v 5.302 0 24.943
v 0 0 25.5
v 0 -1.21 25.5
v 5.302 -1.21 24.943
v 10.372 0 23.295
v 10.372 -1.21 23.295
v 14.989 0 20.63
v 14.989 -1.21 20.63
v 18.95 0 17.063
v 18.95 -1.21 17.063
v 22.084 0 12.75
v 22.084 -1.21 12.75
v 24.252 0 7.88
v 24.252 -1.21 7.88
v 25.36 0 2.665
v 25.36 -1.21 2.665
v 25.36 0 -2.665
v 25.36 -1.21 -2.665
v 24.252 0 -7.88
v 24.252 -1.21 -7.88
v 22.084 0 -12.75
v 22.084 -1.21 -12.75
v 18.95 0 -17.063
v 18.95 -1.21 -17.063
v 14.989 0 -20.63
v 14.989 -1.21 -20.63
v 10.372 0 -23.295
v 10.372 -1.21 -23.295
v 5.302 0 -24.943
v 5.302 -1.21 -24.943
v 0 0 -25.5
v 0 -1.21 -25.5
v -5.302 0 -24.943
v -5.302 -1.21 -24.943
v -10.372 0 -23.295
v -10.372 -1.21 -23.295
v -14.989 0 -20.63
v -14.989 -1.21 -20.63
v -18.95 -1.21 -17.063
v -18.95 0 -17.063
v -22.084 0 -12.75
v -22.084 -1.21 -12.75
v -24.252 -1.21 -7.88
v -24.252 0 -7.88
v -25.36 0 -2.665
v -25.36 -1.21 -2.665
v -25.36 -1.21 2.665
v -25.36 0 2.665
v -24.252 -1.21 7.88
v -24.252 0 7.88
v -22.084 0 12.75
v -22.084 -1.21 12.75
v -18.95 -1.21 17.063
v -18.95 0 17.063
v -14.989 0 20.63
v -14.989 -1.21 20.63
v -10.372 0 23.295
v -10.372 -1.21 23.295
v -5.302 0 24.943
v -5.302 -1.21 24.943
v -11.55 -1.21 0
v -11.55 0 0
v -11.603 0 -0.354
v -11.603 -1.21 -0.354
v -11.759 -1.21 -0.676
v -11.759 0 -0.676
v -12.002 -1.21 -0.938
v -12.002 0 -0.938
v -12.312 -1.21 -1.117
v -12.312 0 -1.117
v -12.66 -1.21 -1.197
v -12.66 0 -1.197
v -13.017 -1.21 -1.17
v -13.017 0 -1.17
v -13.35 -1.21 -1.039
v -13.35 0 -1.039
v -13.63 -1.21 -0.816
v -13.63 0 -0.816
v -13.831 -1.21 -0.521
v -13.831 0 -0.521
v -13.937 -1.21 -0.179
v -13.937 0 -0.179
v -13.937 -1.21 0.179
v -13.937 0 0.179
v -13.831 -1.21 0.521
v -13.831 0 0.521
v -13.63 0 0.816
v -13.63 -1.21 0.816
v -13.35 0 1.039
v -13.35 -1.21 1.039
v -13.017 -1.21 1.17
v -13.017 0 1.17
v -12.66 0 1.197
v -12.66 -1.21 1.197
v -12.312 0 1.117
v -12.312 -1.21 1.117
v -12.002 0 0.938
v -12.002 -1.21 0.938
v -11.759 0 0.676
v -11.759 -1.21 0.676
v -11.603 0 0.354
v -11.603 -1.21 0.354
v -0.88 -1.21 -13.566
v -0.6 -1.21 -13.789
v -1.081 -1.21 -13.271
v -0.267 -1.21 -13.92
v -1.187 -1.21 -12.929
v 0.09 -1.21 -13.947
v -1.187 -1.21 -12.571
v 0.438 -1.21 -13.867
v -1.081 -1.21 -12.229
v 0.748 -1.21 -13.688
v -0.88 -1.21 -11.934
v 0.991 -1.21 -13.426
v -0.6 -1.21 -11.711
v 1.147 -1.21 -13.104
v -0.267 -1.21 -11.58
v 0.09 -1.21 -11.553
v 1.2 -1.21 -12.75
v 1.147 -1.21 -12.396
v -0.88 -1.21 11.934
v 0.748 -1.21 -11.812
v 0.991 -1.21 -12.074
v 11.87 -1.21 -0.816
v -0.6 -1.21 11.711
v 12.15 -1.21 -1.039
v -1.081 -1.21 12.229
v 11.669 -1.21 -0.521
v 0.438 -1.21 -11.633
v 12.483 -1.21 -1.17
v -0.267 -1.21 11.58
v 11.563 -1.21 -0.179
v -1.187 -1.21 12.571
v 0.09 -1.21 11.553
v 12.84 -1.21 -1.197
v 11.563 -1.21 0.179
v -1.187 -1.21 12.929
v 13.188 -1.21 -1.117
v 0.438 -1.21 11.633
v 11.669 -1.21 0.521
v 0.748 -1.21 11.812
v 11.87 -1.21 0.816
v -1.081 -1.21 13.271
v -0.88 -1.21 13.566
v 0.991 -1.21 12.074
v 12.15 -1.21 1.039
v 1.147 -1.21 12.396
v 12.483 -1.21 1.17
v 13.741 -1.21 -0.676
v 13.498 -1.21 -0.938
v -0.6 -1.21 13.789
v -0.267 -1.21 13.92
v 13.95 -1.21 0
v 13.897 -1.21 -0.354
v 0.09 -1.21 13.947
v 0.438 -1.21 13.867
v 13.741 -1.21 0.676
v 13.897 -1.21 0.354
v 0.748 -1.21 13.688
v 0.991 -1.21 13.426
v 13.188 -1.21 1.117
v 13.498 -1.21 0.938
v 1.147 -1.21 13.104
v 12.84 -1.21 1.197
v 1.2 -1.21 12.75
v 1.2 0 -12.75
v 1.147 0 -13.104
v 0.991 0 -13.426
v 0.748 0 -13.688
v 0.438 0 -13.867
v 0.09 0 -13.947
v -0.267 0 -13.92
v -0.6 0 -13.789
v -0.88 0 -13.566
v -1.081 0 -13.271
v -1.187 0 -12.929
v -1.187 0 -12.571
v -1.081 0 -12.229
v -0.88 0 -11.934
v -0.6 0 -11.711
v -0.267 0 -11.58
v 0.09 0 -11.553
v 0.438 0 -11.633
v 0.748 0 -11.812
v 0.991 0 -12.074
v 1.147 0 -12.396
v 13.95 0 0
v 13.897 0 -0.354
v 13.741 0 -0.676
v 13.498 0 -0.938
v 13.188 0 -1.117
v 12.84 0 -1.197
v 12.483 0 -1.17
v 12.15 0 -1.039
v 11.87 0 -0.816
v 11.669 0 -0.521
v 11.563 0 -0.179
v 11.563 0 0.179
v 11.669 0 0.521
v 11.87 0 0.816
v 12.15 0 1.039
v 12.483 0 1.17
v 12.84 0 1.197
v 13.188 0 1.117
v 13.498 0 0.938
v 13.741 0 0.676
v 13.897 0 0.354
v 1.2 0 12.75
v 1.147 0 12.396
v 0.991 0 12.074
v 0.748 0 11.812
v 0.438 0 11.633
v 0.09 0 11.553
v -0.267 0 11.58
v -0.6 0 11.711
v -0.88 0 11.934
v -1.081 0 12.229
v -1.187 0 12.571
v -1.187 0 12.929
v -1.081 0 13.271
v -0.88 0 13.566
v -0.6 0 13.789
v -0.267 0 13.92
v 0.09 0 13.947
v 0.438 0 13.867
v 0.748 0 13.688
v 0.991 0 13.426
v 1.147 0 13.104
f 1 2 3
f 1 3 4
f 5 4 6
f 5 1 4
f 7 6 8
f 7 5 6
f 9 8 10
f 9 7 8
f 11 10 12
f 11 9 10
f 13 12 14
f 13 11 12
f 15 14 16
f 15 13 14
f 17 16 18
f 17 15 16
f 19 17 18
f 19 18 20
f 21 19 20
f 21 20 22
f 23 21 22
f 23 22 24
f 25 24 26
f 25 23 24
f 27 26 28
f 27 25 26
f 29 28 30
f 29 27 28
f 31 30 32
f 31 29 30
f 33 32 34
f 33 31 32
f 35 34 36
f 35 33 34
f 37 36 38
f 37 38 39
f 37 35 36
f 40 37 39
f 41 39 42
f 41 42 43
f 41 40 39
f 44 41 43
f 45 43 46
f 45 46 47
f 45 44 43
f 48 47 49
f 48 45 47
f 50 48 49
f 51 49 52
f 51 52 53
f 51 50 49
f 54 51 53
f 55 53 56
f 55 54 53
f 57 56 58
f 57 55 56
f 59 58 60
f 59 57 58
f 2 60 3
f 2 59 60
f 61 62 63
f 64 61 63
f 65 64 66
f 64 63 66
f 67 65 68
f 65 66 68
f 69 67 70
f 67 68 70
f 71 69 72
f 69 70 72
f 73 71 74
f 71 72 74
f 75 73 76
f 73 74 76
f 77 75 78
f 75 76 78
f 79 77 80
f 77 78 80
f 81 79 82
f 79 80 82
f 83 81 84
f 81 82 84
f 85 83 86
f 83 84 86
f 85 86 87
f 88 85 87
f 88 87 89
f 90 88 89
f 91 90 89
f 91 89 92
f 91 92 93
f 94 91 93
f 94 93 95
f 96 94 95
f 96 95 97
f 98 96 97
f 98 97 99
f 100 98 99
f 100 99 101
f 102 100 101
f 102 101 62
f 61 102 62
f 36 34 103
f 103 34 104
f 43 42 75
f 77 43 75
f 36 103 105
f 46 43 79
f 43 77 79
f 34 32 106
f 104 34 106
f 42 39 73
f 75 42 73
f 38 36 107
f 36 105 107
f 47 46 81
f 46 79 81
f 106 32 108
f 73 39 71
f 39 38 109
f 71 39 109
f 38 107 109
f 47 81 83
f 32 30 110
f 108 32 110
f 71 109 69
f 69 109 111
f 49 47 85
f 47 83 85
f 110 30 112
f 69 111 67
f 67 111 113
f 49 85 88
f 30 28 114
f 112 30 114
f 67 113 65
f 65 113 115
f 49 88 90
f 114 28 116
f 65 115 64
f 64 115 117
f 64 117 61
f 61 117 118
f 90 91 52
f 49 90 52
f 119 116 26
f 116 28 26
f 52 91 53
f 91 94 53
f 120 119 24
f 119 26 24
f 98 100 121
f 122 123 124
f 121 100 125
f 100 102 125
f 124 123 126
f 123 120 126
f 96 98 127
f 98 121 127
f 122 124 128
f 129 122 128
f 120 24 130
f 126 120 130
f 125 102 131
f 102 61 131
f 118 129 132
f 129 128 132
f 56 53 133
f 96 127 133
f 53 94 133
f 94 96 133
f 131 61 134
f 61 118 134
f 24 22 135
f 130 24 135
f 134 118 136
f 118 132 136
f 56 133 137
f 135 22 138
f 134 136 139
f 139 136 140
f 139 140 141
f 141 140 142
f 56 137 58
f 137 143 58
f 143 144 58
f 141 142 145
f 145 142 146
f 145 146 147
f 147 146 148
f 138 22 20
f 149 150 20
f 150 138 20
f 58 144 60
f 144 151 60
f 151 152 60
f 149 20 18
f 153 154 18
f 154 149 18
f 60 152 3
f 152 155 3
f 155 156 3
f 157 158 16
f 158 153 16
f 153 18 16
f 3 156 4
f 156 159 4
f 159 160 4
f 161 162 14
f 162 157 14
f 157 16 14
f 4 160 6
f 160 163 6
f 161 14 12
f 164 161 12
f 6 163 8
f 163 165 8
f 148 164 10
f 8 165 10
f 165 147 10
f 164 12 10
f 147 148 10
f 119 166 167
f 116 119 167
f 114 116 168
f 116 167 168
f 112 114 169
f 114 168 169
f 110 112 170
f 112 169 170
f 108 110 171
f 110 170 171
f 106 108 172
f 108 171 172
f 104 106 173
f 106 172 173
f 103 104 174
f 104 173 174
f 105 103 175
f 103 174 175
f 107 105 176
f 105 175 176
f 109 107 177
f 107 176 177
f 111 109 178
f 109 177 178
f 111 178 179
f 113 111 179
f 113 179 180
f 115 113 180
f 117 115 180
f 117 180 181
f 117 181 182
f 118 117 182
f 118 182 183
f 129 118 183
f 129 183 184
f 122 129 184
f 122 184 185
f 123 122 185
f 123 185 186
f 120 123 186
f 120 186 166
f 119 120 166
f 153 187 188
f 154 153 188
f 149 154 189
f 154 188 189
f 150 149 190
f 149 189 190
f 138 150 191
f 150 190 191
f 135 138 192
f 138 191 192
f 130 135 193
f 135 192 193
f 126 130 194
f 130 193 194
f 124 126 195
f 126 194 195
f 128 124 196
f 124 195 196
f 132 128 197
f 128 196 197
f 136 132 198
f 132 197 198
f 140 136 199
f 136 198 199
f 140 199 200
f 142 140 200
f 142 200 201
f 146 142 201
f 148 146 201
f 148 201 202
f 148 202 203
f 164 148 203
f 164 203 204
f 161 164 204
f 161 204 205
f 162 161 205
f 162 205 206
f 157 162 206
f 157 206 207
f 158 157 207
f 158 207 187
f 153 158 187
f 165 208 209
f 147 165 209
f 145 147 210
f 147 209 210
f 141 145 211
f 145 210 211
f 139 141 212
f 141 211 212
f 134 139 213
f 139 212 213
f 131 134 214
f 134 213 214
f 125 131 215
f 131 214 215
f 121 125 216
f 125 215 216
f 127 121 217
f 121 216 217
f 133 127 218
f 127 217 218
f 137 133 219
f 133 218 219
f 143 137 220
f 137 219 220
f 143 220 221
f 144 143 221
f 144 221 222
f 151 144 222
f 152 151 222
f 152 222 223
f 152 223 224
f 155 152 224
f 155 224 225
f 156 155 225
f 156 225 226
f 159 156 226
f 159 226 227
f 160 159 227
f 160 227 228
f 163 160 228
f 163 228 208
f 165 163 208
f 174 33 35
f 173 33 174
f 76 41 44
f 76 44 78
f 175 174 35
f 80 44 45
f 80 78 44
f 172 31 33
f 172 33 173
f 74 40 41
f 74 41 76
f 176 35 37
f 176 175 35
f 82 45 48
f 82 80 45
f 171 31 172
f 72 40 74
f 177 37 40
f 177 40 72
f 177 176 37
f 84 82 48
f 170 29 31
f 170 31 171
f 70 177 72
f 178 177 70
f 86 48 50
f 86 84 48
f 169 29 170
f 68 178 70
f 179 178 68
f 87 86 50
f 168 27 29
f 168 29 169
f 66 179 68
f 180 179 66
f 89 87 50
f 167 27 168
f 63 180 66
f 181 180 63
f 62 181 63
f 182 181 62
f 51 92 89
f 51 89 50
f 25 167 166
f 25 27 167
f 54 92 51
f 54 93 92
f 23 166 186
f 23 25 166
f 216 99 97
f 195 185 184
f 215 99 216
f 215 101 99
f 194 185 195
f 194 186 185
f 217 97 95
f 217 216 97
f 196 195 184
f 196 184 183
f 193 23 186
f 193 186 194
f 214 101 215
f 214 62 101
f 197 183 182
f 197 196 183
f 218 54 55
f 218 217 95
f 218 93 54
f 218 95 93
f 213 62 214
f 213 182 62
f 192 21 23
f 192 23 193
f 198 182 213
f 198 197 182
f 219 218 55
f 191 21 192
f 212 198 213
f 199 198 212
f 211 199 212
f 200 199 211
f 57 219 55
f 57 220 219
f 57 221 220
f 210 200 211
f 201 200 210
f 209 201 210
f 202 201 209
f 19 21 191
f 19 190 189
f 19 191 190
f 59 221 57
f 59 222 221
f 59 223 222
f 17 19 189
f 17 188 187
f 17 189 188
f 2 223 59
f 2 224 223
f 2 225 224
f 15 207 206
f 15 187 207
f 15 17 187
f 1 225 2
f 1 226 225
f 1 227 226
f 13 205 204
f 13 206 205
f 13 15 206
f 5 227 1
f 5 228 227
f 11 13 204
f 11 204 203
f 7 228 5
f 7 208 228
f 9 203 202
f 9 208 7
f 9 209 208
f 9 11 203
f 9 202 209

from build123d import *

# Parameters (mm, degrees)
SKETCH2_R                = 25.5
BASE_FLANGE1_DEPTH       = 1.21
M2_CLEARANCE_HOLE1_D     = 2.4
M2_CLEARANCE_HOLE1_DEPTH = 10
M2_CLEARANCE_HOLE1_TIP   = 0.721032743


# Sheet-metal steps are written as plain solids
with BuildPart() as part:
    # Sketch2 → Base-Flange1 (new body)
    with BuildSketch(Plane(origin=(0, 0, 0), x_dir=(1, 0, 0), z_dir=(0, 1, 0))):
        with Locations(Location((0, 0, 0), (0, 0, 270))):
            Circle(SKETCH2_R)
    extrude(amount=-BASE_FLANGE1_DEPTH)

    # M2 Clearance Hole1
    with Locations(Plane(origin=(0, -1.21, 0), x_dir=(-1, 0, 0), z_dir=(0, -1, 0))):
        with Locations((0, -12.75), (-12.75, 0), (12.75, 0), (0, 12.75)):
            Hole(M2_CLEARANCE_HOLE1_D / 2, depth=M2_CLEARANCE_HOLE1_DEPTH)
            with Locations((0, 0, -(M2_CLEARANCE_HOLE1_DEPTH + M2_CLEARANCE_HOLE1_TIP / 2))):  # 118° drill point
                Cone(0, M2_CLEARANCE_HOLE1_D / 2, M2_CLEARANCE_HOLE1_TIP, mode=Mode.SUBTRACT)


solid = part.part
